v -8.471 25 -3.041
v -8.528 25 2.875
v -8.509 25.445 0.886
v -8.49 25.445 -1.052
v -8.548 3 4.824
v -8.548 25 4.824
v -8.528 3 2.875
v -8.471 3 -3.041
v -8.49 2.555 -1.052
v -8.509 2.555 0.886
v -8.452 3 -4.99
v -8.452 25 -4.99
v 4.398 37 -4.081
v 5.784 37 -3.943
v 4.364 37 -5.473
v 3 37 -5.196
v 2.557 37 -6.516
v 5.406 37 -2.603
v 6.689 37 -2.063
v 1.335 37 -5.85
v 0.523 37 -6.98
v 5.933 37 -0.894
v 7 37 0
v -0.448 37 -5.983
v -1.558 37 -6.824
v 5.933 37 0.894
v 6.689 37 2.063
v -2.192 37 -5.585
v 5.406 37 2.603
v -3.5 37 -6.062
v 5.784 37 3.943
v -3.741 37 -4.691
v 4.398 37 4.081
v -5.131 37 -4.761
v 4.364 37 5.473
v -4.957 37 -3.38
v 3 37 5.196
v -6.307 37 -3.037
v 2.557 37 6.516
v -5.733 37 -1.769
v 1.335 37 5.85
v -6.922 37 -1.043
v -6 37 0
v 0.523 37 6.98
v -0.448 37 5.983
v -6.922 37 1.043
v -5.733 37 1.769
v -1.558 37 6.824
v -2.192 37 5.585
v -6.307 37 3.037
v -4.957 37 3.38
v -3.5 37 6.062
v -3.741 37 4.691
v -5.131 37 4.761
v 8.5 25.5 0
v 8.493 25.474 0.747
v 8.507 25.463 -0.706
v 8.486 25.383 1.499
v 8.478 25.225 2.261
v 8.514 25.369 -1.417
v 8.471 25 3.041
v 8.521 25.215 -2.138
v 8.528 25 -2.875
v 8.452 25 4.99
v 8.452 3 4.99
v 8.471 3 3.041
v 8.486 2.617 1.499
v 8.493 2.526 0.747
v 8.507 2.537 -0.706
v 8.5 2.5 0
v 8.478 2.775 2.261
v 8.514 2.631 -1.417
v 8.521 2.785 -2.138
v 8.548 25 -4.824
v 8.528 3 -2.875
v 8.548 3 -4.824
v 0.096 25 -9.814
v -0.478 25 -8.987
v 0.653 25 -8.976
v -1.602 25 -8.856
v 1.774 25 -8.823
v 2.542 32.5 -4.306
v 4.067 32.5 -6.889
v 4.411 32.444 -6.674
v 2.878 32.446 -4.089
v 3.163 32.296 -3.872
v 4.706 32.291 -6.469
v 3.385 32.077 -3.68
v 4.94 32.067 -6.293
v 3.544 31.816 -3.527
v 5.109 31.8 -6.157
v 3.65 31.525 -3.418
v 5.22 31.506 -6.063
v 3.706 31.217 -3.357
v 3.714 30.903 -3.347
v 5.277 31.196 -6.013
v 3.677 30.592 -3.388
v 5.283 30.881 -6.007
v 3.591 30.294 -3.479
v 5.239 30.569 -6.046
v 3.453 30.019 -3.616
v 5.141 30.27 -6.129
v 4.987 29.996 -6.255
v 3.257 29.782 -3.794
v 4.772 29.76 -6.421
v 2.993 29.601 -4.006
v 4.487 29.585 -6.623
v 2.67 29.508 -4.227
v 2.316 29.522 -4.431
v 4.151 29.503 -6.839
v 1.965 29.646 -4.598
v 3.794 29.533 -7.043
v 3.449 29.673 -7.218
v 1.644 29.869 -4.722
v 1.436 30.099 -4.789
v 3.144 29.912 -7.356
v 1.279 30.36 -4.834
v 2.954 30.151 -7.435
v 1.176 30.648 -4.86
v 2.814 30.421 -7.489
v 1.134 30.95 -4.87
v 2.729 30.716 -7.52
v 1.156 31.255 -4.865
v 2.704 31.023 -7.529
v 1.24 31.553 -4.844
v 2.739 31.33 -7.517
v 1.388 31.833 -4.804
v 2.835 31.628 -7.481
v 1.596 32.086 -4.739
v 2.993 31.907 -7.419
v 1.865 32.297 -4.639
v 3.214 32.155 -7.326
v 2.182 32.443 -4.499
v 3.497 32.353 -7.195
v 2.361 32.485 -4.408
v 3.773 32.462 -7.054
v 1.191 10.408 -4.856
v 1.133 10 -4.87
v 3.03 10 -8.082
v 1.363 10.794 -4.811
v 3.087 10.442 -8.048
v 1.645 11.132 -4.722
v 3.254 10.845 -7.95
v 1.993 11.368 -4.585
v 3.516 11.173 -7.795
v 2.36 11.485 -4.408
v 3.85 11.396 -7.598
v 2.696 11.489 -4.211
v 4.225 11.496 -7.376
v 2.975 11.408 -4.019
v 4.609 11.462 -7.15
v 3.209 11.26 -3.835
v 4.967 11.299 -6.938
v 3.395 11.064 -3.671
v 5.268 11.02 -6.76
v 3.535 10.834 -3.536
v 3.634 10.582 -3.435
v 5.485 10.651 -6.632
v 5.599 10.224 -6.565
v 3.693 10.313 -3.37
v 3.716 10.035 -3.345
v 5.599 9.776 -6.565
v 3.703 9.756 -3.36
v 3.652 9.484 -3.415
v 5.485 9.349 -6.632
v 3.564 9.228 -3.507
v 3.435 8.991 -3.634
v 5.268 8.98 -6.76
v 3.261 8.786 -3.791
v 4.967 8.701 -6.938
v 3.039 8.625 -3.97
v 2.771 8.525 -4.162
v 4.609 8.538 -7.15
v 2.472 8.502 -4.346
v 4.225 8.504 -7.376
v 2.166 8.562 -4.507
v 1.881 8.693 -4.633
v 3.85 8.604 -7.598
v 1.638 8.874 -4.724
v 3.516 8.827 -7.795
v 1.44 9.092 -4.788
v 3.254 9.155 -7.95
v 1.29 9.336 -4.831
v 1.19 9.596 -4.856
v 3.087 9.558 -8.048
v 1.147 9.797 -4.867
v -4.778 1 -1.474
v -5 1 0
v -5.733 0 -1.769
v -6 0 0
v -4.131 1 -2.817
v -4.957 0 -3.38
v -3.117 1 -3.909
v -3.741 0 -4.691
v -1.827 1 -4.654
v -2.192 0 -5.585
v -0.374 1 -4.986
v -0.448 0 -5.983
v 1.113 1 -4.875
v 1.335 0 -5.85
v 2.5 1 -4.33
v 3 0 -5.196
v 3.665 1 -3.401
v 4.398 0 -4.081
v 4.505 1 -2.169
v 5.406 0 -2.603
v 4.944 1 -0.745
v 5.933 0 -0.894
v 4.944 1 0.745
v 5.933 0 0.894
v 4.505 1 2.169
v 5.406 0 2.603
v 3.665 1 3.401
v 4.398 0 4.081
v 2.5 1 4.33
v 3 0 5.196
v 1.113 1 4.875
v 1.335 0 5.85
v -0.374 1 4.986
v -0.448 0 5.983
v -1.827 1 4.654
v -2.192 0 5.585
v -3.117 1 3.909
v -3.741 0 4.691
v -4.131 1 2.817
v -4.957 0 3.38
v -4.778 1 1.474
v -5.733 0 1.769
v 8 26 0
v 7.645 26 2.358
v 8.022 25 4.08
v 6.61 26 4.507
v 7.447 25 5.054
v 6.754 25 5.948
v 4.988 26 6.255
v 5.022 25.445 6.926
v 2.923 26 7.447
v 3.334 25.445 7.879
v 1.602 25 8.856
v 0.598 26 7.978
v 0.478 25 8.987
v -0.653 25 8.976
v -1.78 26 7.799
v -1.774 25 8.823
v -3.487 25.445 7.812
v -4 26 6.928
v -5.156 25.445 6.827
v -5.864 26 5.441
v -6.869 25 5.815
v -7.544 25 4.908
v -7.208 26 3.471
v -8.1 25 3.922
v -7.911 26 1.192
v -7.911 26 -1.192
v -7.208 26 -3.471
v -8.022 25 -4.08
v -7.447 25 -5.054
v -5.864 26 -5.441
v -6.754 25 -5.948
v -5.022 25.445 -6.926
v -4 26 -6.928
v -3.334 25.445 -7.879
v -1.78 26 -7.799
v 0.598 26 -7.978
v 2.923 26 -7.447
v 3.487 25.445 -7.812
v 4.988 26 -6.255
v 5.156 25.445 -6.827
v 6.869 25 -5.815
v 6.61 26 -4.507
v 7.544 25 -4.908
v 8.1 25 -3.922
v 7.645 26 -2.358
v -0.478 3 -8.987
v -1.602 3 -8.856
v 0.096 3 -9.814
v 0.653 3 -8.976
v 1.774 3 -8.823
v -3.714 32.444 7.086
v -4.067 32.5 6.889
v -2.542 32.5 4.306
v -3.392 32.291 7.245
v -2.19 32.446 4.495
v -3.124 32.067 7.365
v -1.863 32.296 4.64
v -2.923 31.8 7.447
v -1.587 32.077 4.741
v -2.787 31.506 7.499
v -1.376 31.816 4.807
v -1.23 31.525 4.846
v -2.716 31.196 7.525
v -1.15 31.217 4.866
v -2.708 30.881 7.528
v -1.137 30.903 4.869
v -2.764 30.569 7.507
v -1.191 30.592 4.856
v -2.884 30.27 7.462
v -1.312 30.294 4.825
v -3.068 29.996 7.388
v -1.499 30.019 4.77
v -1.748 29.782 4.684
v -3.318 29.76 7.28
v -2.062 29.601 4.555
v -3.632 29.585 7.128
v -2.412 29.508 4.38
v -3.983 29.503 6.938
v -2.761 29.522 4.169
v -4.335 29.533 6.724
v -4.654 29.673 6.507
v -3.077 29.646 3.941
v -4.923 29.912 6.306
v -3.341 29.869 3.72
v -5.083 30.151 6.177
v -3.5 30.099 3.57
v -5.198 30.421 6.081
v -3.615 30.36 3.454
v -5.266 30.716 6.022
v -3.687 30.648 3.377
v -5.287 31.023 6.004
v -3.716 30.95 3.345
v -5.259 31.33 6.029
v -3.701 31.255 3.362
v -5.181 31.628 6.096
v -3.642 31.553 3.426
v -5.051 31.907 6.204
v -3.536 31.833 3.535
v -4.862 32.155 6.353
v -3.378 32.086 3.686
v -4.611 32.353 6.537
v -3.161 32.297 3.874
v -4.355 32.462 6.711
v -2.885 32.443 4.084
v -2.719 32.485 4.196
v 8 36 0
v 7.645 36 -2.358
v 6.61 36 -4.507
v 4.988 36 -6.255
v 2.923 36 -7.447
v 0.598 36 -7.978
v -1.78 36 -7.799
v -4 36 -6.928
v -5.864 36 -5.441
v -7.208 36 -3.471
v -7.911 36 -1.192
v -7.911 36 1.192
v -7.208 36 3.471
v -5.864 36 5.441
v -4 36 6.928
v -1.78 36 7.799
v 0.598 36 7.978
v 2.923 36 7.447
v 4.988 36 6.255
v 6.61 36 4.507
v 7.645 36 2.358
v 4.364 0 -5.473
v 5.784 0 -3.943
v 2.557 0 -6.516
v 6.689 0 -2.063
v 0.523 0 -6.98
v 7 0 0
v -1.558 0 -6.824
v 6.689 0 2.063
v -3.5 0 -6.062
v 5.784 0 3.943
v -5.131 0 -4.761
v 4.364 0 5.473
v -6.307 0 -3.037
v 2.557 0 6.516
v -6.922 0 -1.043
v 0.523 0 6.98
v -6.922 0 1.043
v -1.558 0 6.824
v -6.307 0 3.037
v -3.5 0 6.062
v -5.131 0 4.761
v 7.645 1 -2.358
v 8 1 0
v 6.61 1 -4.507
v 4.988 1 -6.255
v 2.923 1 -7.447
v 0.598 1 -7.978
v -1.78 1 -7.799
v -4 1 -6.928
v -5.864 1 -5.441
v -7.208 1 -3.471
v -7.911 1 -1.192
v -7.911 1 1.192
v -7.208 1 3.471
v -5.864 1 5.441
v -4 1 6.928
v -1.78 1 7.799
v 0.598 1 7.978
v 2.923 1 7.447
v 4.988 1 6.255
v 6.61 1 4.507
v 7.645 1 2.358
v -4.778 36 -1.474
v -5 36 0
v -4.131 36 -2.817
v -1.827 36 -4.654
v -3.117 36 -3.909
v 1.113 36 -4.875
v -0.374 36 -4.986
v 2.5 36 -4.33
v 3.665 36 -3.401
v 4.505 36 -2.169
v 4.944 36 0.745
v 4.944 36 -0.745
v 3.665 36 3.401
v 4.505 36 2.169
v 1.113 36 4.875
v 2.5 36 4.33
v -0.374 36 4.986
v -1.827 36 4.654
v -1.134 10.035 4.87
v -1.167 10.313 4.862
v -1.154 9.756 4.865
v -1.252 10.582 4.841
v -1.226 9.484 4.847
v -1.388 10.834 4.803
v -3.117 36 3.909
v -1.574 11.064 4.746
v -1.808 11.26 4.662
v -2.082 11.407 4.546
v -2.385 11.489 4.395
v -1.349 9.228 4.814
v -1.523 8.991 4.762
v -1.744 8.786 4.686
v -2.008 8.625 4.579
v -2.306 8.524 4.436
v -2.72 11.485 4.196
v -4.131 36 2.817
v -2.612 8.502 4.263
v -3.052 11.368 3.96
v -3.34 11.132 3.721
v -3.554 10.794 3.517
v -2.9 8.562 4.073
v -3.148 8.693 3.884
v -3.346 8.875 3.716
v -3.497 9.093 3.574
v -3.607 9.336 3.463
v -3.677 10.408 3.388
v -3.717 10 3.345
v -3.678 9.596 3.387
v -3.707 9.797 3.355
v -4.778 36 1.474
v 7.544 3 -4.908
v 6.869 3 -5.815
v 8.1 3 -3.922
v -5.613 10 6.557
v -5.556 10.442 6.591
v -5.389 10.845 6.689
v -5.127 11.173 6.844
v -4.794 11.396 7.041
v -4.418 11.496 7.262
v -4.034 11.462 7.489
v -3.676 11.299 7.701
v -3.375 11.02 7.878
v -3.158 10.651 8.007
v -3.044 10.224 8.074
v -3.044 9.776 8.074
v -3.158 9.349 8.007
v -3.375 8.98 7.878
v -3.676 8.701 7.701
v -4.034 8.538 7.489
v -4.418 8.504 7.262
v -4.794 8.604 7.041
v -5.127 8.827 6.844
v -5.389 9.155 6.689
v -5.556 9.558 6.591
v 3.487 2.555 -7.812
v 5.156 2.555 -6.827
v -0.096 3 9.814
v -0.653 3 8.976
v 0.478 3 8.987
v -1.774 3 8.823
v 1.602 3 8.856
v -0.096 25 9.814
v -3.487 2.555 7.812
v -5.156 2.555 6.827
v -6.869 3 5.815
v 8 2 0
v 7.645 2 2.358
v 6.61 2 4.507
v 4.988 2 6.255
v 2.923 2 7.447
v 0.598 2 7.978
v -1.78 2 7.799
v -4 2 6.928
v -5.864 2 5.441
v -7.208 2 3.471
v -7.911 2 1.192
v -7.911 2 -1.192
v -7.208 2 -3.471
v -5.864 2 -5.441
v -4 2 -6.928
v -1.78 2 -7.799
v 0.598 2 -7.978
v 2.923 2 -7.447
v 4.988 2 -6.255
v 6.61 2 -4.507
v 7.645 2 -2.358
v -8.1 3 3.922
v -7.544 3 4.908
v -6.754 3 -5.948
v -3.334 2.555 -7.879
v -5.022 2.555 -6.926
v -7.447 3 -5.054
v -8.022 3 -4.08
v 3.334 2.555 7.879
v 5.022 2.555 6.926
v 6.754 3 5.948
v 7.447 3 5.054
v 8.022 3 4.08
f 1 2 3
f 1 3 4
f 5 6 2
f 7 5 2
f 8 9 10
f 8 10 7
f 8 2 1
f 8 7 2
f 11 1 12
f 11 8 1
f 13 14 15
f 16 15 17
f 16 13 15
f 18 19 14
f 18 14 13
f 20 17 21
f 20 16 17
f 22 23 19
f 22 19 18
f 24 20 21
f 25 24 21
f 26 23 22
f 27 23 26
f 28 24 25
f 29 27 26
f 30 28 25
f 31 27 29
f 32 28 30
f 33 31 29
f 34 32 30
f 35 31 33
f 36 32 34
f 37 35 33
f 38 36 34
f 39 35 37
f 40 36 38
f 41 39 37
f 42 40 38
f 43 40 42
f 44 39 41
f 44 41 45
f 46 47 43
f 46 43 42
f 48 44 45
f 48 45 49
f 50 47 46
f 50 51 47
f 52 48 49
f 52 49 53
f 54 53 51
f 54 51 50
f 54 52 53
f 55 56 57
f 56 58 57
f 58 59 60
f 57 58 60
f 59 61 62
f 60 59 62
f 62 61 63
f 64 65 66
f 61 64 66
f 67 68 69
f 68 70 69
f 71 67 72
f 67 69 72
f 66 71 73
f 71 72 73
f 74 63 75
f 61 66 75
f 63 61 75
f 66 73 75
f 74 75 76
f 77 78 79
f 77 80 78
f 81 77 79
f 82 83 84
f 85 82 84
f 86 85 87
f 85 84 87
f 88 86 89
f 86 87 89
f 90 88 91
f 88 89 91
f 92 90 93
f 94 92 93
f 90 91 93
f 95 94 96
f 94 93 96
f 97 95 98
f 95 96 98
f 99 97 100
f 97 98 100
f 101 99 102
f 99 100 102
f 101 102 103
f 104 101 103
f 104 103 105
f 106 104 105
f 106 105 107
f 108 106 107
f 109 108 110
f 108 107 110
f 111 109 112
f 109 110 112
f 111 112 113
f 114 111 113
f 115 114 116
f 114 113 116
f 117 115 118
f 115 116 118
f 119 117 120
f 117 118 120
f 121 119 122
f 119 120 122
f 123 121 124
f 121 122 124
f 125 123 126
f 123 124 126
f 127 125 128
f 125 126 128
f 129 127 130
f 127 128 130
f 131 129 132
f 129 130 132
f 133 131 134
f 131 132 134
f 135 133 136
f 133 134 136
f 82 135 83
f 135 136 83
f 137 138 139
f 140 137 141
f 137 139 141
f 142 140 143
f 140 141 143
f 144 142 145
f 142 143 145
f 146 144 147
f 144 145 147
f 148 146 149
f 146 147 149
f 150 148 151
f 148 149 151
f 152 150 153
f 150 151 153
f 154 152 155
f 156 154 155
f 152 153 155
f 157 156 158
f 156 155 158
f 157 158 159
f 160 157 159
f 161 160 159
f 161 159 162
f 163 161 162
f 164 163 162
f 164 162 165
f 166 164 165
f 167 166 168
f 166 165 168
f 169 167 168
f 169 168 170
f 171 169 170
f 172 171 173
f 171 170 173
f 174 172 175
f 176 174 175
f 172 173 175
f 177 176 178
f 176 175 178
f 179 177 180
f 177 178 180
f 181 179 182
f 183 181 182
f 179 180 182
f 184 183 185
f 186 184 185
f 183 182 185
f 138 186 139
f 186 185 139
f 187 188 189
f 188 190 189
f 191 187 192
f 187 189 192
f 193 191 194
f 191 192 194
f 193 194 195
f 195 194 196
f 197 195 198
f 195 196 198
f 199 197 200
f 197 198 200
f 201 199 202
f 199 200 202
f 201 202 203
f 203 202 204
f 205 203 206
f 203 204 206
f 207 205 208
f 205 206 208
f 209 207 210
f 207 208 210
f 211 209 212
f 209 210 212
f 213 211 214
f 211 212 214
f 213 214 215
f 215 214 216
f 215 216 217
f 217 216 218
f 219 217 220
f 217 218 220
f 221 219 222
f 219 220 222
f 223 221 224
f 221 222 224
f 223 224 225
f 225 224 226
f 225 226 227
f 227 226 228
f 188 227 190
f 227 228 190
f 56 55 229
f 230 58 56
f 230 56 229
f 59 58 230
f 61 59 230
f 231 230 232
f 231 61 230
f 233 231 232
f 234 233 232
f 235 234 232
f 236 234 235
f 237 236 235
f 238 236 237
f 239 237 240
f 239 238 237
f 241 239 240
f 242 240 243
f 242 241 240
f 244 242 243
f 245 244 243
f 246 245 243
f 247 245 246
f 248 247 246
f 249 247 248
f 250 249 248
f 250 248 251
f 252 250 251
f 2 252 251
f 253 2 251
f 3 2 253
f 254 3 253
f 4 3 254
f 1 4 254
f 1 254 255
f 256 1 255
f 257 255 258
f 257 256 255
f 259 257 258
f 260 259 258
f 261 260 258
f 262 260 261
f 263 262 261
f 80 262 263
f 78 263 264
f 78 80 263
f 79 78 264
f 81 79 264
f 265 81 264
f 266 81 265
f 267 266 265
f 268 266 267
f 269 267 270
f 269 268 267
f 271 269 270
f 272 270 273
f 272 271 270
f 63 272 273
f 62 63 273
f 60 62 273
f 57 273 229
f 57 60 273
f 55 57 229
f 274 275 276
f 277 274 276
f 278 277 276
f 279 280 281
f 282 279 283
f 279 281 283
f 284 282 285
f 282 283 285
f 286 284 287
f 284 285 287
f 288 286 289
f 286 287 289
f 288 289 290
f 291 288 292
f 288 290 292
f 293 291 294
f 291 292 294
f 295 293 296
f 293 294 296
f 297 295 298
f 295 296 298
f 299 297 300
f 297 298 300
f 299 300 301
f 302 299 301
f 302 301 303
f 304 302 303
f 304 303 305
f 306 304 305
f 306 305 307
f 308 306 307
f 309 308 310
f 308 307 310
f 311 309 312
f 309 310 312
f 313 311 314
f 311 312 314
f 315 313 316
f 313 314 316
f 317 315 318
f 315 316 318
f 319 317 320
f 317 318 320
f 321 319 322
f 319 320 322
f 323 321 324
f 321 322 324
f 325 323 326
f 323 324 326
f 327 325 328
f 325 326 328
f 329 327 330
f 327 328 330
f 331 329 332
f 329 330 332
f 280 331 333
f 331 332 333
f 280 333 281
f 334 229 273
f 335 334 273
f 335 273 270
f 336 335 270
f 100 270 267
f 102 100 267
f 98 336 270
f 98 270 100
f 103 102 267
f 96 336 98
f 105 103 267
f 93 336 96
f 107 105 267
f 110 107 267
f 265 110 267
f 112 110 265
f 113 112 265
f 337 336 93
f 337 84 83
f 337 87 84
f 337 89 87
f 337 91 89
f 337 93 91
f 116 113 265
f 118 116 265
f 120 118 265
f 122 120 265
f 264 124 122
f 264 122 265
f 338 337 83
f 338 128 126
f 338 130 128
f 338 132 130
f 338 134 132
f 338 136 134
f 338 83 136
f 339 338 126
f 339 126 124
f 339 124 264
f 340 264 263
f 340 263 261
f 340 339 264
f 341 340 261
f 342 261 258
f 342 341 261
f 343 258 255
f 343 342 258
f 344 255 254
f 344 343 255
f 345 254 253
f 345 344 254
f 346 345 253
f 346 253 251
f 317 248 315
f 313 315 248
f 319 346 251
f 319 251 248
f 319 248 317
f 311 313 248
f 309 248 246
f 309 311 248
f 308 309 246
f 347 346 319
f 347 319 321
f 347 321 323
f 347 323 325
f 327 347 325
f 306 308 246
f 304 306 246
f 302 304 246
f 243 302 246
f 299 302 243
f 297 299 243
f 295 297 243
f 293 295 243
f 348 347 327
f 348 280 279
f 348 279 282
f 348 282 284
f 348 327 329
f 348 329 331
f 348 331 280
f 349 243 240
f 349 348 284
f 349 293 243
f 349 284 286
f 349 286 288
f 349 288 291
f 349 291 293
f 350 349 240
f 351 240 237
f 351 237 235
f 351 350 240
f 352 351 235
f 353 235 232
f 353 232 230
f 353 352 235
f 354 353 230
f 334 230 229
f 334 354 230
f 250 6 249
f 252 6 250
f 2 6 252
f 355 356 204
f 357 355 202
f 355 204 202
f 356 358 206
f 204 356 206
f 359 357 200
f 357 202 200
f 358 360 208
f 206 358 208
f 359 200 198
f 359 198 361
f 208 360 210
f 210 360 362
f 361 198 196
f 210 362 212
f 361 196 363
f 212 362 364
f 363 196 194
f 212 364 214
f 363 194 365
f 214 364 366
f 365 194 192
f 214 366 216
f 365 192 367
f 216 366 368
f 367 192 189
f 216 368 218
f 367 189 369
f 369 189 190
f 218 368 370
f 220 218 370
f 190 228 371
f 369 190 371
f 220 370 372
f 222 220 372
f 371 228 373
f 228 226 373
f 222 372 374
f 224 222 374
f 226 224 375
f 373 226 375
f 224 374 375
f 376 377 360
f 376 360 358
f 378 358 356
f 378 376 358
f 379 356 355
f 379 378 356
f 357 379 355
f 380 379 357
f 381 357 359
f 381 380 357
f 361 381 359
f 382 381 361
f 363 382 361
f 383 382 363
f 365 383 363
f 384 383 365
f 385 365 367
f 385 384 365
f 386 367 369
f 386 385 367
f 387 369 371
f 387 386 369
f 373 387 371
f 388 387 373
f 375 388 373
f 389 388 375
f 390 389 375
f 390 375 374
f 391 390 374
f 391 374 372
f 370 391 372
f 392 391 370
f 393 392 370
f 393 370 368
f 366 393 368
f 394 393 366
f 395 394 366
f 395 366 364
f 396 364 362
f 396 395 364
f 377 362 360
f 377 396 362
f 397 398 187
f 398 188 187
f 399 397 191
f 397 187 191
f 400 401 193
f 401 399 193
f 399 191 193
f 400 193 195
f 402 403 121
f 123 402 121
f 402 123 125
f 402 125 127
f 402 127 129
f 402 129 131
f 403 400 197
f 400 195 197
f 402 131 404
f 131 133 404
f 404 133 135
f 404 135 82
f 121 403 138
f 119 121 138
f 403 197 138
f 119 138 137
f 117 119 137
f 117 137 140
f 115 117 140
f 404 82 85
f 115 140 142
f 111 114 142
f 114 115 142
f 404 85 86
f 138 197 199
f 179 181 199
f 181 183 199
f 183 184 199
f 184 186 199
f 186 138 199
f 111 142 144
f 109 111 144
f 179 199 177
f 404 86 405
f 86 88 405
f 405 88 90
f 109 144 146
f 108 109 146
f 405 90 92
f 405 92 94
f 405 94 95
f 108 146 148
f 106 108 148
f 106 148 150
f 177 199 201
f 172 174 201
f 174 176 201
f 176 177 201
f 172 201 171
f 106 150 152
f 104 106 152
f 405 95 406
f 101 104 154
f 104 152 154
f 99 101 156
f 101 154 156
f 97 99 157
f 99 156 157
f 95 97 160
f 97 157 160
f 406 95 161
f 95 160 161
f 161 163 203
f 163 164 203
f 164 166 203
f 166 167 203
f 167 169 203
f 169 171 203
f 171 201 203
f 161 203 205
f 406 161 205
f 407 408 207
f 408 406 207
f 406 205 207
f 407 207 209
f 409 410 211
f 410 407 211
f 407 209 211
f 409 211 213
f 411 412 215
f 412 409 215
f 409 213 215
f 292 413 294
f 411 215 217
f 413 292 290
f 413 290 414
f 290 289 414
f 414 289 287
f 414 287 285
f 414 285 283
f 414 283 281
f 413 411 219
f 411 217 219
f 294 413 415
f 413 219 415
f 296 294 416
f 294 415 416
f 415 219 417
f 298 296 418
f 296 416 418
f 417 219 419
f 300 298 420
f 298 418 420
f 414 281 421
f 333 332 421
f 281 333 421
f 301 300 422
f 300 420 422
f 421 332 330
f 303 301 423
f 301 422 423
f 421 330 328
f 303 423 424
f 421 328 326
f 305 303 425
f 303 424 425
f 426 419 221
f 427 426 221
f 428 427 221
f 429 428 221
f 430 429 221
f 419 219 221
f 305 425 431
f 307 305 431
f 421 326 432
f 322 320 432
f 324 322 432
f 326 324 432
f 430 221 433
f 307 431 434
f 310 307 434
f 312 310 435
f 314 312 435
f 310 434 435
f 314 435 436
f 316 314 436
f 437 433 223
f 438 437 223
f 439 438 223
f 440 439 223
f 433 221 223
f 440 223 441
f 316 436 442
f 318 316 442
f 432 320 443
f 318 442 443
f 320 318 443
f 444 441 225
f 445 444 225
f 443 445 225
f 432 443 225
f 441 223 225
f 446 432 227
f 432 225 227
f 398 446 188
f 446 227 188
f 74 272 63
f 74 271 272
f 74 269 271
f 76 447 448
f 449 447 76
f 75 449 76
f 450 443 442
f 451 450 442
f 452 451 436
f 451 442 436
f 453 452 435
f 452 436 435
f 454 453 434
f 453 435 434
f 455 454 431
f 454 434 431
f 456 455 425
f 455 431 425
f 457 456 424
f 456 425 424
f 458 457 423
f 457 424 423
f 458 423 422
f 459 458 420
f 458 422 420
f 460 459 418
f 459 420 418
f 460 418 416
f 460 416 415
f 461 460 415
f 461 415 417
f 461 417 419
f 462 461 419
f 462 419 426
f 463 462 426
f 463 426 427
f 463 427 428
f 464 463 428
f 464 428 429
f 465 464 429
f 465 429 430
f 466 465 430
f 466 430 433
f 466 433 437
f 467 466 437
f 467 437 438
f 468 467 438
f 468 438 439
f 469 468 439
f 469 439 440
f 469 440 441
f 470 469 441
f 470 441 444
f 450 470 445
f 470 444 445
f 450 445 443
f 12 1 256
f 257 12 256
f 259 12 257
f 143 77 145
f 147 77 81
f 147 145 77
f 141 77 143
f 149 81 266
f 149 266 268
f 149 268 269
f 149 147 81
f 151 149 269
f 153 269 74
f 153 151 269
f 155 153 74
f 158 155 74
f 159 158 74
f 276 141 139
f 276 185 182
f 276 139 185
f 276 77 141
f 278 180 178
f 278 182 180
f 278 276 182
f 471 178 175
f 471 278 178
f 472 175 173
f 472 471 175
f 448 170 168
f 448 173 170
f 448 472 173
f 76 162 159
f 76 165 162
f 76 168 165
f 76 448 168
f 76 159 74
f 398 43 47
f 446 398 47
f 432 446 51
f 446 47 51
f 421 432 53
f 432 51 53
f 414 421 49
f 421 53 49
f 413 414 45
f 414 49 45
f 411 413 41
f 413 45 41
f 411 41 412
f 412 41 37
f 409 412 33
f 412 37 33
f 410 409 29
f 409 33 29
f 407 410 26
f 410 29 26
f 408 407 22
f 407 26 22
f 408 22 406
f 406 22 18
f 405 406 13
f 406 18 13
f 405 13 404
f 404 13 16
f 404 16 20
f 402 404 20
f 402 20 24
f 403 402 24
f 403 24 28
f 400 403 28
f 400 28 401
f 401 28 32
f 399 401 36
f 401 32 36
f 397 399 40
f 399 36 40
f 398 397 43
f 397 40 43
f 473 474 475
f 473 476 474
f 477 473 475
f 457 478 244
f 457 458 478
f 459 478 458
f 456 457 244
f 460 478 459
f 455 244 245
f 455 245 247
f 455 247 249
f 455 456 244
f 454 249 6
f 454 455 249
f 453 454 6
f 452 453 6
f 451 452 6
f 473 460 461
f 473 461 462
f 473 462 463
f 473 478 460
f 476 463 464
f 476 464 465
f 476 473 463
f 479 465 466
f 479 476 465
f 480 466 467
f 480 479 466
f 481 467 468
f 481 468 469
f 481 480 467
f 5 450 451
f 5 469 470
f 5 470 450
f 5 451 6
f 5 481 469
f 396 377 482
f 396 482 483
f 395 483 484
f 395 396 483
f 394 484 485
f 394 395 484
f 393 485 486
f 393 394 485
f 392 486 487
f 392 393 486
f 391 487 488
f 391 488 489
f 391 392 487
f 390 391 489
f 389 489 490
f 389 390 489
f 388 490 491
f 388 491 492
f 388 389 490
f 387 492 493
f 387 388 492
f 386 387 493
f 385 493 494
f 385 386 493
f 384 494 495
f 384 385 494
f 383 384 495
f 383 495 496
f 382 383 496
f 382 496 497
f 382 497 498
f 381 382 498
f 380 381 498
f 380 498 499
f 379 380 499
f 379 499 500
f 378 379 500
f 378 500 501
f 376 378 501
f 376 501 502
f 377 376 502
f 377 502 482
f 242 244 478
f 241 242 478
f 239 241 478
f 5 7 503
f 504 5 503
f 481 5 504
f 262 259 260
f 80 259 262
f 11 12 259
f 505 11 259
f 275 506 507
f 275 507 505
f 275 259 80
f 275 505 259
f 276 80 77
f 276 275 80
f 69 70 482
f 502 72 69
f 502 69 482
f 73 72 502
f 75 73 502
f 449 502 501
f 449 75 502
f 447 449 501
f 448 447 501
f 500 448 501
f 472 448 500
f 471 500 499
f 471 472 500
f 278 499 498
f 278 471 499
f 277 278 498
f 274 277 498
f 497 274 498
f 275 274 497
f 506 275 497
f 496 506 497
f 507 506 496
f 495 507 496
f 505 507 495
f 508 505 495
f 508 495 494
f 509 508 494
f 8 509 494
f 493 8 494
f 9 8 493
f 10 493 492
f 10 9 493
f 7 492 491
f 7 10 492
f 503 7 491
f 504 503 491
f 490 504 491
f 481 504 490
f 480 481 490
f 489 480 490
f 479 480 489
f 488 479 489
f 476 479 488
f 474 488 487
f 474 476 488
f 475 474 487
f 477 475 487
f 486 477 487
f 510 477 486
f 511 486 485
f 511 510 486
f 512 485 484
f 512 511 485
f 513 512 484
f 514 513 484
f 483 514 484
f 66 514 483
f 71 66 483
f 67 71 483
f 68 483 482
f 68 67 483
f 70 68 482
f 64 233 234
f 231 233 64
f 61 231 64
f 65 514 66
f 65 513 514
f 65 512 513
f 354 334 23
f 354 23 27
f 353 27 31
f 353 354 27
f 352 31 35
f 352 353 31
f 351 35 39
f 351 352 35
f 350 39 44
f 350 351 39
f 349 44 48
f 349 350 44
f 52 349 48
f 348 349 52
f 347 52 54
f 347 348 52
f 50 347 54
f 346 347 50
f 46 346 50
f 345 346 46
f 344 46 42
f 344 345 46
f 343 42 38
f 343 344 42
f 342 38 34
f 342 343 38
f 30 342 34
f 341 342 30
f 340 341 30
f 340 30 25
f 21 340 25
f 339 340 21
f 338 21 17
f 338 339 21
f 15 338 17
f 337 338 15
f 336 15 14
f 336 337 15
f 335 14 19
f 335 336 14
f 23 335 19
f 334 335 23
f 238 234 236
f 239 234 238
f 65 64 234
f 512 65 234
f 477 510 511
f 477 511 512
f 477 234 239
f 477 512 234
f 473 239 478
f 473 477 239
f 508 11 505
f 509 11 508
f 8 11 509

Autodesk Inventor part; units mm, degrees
ref_plane "YZ Plane" through (0, 0, 0) normal (1, 0, 0) x (0, 1, 0)
ref_plane "XZ Plane" through (0, 0, 0) normal (0, 1, 0) x (-1, 0, 0)
ref_plane "XY Plane" through (0, 0, 0) normal (0, 0, 1) x (1, 0, 0)
sketch "Sketch1" plane through (0, 0, 0) normal (0, 1, 0) x (-1, 0, 0)
  line L0 (8.5475, 4.8243) -> (8.4517, -4.9902)
  line L1 (8.4517, -4.9902) -> (-0.0957, -9.8145)
  line L2 (-0.0957, -9.8145) -> (-8.5475, -4.8243)
  line L3 (-8.5475, -4.8243) -> (-8.4517, 4.9902)
  line L4 (-8.4517, 4.9902) -> (0.0957, 9.8145)
  line L5 (0.0957, 9.8145) -> (8.5475, 4.8243)
  circle A0 centre (0, 0) radius 5
  dimension "d0" = 17
  dimension "d1" = 10
extrude "Extrusion1" add sketch "Sketch1" along normal blind 37
sketch "Sketch2" plane through (0, 37, 0) normal (0, 1, 0) x (1, 0, 0)
  circle A0 centre (0, 0) radius 8
  circle A1 centre (0, 0) radius 13
  dimension "d4" = 16
  dimension "d5" = 5
extrude "Extrusion2" cut sketch "Sketch2" against normal blind 12
sketch "Sketch3" plane through (0, 0, 0) normal (0, -1, 0) x (1, 0, 0)
  circle A0 centre (0, 0) radius 8
  circle A1 centre (0, 0) radius 13
  dimension "d9" = 16
  dimension "d10" = 5
extrude "Extrusion3" cut sketch "Sketch3" against normal blind 3
chamfer "Chamfer1" distance 1 angle 45 6 edges at (-8, 3, 0) (-8, 0, 0) (5, 0, 0) (-8, 25, 0) (-8, 37, 0) (5, 37, 0)
ref_plane "Work Plane1" through (0, 31, 0) normal (0, 1, 0) x (1, 0, 0)
sketch "Sketch4" plane through (0, 31, 0) normal (0, 1, 0) x (1, 0, 0)
  line L0 (0, 0) -> (3.9142, 6.6294)
  line L1 (0.0957, 9.8145) -> (0, 0)
  point P0 (8.5475, 4.8243)
  dimension "d20" = 30
ref_plane "Work Plane3" through (4.0674, 31, -6.8889) normal (0.5084234, 0, -0.8611072) x (0, 1, 0)
sketch "Sketch6" plane through (4.0674, 31, -6.8889) normal (0.5084234, 0, -0.8611072) x (0, 1, 0)
  circle A0 centre (0, 0) radius 1.5
  point P0 (-31, 0)
  dimension "d16" = 3
extrude "Extrusion4" cut sketch "Sketch6" against normal through all
sketch "Sketch9" plane through (0.0957, 3, -9.8145) normal (0.5084234, 0, -0.8611072) x (-0.8611072, 0, -0.5084234)
  circle A0 centre (-4.9075, 7) radius 1.5
  line L0 (-9.815, 0) -> (-9.815, 22) projected
  line L1 (0, 0) -> (0, 22) projected
  point P0 (-4.9075, -3)
  dimension "d31" = 3
  dimension "d32" = 9.8149
  dimension "d33" = 4.9075
  dimension "d34" = 10
extrude "Extrusion5" cut sketch "Sketch9" against normal through all
thread "Thread2" size "M10x1.5" class "6H" standard "ANSI Metric M Profile" length 20
equation "\"d33\" = 0.5 * d32"
properties part number "AnyaKicsi"
